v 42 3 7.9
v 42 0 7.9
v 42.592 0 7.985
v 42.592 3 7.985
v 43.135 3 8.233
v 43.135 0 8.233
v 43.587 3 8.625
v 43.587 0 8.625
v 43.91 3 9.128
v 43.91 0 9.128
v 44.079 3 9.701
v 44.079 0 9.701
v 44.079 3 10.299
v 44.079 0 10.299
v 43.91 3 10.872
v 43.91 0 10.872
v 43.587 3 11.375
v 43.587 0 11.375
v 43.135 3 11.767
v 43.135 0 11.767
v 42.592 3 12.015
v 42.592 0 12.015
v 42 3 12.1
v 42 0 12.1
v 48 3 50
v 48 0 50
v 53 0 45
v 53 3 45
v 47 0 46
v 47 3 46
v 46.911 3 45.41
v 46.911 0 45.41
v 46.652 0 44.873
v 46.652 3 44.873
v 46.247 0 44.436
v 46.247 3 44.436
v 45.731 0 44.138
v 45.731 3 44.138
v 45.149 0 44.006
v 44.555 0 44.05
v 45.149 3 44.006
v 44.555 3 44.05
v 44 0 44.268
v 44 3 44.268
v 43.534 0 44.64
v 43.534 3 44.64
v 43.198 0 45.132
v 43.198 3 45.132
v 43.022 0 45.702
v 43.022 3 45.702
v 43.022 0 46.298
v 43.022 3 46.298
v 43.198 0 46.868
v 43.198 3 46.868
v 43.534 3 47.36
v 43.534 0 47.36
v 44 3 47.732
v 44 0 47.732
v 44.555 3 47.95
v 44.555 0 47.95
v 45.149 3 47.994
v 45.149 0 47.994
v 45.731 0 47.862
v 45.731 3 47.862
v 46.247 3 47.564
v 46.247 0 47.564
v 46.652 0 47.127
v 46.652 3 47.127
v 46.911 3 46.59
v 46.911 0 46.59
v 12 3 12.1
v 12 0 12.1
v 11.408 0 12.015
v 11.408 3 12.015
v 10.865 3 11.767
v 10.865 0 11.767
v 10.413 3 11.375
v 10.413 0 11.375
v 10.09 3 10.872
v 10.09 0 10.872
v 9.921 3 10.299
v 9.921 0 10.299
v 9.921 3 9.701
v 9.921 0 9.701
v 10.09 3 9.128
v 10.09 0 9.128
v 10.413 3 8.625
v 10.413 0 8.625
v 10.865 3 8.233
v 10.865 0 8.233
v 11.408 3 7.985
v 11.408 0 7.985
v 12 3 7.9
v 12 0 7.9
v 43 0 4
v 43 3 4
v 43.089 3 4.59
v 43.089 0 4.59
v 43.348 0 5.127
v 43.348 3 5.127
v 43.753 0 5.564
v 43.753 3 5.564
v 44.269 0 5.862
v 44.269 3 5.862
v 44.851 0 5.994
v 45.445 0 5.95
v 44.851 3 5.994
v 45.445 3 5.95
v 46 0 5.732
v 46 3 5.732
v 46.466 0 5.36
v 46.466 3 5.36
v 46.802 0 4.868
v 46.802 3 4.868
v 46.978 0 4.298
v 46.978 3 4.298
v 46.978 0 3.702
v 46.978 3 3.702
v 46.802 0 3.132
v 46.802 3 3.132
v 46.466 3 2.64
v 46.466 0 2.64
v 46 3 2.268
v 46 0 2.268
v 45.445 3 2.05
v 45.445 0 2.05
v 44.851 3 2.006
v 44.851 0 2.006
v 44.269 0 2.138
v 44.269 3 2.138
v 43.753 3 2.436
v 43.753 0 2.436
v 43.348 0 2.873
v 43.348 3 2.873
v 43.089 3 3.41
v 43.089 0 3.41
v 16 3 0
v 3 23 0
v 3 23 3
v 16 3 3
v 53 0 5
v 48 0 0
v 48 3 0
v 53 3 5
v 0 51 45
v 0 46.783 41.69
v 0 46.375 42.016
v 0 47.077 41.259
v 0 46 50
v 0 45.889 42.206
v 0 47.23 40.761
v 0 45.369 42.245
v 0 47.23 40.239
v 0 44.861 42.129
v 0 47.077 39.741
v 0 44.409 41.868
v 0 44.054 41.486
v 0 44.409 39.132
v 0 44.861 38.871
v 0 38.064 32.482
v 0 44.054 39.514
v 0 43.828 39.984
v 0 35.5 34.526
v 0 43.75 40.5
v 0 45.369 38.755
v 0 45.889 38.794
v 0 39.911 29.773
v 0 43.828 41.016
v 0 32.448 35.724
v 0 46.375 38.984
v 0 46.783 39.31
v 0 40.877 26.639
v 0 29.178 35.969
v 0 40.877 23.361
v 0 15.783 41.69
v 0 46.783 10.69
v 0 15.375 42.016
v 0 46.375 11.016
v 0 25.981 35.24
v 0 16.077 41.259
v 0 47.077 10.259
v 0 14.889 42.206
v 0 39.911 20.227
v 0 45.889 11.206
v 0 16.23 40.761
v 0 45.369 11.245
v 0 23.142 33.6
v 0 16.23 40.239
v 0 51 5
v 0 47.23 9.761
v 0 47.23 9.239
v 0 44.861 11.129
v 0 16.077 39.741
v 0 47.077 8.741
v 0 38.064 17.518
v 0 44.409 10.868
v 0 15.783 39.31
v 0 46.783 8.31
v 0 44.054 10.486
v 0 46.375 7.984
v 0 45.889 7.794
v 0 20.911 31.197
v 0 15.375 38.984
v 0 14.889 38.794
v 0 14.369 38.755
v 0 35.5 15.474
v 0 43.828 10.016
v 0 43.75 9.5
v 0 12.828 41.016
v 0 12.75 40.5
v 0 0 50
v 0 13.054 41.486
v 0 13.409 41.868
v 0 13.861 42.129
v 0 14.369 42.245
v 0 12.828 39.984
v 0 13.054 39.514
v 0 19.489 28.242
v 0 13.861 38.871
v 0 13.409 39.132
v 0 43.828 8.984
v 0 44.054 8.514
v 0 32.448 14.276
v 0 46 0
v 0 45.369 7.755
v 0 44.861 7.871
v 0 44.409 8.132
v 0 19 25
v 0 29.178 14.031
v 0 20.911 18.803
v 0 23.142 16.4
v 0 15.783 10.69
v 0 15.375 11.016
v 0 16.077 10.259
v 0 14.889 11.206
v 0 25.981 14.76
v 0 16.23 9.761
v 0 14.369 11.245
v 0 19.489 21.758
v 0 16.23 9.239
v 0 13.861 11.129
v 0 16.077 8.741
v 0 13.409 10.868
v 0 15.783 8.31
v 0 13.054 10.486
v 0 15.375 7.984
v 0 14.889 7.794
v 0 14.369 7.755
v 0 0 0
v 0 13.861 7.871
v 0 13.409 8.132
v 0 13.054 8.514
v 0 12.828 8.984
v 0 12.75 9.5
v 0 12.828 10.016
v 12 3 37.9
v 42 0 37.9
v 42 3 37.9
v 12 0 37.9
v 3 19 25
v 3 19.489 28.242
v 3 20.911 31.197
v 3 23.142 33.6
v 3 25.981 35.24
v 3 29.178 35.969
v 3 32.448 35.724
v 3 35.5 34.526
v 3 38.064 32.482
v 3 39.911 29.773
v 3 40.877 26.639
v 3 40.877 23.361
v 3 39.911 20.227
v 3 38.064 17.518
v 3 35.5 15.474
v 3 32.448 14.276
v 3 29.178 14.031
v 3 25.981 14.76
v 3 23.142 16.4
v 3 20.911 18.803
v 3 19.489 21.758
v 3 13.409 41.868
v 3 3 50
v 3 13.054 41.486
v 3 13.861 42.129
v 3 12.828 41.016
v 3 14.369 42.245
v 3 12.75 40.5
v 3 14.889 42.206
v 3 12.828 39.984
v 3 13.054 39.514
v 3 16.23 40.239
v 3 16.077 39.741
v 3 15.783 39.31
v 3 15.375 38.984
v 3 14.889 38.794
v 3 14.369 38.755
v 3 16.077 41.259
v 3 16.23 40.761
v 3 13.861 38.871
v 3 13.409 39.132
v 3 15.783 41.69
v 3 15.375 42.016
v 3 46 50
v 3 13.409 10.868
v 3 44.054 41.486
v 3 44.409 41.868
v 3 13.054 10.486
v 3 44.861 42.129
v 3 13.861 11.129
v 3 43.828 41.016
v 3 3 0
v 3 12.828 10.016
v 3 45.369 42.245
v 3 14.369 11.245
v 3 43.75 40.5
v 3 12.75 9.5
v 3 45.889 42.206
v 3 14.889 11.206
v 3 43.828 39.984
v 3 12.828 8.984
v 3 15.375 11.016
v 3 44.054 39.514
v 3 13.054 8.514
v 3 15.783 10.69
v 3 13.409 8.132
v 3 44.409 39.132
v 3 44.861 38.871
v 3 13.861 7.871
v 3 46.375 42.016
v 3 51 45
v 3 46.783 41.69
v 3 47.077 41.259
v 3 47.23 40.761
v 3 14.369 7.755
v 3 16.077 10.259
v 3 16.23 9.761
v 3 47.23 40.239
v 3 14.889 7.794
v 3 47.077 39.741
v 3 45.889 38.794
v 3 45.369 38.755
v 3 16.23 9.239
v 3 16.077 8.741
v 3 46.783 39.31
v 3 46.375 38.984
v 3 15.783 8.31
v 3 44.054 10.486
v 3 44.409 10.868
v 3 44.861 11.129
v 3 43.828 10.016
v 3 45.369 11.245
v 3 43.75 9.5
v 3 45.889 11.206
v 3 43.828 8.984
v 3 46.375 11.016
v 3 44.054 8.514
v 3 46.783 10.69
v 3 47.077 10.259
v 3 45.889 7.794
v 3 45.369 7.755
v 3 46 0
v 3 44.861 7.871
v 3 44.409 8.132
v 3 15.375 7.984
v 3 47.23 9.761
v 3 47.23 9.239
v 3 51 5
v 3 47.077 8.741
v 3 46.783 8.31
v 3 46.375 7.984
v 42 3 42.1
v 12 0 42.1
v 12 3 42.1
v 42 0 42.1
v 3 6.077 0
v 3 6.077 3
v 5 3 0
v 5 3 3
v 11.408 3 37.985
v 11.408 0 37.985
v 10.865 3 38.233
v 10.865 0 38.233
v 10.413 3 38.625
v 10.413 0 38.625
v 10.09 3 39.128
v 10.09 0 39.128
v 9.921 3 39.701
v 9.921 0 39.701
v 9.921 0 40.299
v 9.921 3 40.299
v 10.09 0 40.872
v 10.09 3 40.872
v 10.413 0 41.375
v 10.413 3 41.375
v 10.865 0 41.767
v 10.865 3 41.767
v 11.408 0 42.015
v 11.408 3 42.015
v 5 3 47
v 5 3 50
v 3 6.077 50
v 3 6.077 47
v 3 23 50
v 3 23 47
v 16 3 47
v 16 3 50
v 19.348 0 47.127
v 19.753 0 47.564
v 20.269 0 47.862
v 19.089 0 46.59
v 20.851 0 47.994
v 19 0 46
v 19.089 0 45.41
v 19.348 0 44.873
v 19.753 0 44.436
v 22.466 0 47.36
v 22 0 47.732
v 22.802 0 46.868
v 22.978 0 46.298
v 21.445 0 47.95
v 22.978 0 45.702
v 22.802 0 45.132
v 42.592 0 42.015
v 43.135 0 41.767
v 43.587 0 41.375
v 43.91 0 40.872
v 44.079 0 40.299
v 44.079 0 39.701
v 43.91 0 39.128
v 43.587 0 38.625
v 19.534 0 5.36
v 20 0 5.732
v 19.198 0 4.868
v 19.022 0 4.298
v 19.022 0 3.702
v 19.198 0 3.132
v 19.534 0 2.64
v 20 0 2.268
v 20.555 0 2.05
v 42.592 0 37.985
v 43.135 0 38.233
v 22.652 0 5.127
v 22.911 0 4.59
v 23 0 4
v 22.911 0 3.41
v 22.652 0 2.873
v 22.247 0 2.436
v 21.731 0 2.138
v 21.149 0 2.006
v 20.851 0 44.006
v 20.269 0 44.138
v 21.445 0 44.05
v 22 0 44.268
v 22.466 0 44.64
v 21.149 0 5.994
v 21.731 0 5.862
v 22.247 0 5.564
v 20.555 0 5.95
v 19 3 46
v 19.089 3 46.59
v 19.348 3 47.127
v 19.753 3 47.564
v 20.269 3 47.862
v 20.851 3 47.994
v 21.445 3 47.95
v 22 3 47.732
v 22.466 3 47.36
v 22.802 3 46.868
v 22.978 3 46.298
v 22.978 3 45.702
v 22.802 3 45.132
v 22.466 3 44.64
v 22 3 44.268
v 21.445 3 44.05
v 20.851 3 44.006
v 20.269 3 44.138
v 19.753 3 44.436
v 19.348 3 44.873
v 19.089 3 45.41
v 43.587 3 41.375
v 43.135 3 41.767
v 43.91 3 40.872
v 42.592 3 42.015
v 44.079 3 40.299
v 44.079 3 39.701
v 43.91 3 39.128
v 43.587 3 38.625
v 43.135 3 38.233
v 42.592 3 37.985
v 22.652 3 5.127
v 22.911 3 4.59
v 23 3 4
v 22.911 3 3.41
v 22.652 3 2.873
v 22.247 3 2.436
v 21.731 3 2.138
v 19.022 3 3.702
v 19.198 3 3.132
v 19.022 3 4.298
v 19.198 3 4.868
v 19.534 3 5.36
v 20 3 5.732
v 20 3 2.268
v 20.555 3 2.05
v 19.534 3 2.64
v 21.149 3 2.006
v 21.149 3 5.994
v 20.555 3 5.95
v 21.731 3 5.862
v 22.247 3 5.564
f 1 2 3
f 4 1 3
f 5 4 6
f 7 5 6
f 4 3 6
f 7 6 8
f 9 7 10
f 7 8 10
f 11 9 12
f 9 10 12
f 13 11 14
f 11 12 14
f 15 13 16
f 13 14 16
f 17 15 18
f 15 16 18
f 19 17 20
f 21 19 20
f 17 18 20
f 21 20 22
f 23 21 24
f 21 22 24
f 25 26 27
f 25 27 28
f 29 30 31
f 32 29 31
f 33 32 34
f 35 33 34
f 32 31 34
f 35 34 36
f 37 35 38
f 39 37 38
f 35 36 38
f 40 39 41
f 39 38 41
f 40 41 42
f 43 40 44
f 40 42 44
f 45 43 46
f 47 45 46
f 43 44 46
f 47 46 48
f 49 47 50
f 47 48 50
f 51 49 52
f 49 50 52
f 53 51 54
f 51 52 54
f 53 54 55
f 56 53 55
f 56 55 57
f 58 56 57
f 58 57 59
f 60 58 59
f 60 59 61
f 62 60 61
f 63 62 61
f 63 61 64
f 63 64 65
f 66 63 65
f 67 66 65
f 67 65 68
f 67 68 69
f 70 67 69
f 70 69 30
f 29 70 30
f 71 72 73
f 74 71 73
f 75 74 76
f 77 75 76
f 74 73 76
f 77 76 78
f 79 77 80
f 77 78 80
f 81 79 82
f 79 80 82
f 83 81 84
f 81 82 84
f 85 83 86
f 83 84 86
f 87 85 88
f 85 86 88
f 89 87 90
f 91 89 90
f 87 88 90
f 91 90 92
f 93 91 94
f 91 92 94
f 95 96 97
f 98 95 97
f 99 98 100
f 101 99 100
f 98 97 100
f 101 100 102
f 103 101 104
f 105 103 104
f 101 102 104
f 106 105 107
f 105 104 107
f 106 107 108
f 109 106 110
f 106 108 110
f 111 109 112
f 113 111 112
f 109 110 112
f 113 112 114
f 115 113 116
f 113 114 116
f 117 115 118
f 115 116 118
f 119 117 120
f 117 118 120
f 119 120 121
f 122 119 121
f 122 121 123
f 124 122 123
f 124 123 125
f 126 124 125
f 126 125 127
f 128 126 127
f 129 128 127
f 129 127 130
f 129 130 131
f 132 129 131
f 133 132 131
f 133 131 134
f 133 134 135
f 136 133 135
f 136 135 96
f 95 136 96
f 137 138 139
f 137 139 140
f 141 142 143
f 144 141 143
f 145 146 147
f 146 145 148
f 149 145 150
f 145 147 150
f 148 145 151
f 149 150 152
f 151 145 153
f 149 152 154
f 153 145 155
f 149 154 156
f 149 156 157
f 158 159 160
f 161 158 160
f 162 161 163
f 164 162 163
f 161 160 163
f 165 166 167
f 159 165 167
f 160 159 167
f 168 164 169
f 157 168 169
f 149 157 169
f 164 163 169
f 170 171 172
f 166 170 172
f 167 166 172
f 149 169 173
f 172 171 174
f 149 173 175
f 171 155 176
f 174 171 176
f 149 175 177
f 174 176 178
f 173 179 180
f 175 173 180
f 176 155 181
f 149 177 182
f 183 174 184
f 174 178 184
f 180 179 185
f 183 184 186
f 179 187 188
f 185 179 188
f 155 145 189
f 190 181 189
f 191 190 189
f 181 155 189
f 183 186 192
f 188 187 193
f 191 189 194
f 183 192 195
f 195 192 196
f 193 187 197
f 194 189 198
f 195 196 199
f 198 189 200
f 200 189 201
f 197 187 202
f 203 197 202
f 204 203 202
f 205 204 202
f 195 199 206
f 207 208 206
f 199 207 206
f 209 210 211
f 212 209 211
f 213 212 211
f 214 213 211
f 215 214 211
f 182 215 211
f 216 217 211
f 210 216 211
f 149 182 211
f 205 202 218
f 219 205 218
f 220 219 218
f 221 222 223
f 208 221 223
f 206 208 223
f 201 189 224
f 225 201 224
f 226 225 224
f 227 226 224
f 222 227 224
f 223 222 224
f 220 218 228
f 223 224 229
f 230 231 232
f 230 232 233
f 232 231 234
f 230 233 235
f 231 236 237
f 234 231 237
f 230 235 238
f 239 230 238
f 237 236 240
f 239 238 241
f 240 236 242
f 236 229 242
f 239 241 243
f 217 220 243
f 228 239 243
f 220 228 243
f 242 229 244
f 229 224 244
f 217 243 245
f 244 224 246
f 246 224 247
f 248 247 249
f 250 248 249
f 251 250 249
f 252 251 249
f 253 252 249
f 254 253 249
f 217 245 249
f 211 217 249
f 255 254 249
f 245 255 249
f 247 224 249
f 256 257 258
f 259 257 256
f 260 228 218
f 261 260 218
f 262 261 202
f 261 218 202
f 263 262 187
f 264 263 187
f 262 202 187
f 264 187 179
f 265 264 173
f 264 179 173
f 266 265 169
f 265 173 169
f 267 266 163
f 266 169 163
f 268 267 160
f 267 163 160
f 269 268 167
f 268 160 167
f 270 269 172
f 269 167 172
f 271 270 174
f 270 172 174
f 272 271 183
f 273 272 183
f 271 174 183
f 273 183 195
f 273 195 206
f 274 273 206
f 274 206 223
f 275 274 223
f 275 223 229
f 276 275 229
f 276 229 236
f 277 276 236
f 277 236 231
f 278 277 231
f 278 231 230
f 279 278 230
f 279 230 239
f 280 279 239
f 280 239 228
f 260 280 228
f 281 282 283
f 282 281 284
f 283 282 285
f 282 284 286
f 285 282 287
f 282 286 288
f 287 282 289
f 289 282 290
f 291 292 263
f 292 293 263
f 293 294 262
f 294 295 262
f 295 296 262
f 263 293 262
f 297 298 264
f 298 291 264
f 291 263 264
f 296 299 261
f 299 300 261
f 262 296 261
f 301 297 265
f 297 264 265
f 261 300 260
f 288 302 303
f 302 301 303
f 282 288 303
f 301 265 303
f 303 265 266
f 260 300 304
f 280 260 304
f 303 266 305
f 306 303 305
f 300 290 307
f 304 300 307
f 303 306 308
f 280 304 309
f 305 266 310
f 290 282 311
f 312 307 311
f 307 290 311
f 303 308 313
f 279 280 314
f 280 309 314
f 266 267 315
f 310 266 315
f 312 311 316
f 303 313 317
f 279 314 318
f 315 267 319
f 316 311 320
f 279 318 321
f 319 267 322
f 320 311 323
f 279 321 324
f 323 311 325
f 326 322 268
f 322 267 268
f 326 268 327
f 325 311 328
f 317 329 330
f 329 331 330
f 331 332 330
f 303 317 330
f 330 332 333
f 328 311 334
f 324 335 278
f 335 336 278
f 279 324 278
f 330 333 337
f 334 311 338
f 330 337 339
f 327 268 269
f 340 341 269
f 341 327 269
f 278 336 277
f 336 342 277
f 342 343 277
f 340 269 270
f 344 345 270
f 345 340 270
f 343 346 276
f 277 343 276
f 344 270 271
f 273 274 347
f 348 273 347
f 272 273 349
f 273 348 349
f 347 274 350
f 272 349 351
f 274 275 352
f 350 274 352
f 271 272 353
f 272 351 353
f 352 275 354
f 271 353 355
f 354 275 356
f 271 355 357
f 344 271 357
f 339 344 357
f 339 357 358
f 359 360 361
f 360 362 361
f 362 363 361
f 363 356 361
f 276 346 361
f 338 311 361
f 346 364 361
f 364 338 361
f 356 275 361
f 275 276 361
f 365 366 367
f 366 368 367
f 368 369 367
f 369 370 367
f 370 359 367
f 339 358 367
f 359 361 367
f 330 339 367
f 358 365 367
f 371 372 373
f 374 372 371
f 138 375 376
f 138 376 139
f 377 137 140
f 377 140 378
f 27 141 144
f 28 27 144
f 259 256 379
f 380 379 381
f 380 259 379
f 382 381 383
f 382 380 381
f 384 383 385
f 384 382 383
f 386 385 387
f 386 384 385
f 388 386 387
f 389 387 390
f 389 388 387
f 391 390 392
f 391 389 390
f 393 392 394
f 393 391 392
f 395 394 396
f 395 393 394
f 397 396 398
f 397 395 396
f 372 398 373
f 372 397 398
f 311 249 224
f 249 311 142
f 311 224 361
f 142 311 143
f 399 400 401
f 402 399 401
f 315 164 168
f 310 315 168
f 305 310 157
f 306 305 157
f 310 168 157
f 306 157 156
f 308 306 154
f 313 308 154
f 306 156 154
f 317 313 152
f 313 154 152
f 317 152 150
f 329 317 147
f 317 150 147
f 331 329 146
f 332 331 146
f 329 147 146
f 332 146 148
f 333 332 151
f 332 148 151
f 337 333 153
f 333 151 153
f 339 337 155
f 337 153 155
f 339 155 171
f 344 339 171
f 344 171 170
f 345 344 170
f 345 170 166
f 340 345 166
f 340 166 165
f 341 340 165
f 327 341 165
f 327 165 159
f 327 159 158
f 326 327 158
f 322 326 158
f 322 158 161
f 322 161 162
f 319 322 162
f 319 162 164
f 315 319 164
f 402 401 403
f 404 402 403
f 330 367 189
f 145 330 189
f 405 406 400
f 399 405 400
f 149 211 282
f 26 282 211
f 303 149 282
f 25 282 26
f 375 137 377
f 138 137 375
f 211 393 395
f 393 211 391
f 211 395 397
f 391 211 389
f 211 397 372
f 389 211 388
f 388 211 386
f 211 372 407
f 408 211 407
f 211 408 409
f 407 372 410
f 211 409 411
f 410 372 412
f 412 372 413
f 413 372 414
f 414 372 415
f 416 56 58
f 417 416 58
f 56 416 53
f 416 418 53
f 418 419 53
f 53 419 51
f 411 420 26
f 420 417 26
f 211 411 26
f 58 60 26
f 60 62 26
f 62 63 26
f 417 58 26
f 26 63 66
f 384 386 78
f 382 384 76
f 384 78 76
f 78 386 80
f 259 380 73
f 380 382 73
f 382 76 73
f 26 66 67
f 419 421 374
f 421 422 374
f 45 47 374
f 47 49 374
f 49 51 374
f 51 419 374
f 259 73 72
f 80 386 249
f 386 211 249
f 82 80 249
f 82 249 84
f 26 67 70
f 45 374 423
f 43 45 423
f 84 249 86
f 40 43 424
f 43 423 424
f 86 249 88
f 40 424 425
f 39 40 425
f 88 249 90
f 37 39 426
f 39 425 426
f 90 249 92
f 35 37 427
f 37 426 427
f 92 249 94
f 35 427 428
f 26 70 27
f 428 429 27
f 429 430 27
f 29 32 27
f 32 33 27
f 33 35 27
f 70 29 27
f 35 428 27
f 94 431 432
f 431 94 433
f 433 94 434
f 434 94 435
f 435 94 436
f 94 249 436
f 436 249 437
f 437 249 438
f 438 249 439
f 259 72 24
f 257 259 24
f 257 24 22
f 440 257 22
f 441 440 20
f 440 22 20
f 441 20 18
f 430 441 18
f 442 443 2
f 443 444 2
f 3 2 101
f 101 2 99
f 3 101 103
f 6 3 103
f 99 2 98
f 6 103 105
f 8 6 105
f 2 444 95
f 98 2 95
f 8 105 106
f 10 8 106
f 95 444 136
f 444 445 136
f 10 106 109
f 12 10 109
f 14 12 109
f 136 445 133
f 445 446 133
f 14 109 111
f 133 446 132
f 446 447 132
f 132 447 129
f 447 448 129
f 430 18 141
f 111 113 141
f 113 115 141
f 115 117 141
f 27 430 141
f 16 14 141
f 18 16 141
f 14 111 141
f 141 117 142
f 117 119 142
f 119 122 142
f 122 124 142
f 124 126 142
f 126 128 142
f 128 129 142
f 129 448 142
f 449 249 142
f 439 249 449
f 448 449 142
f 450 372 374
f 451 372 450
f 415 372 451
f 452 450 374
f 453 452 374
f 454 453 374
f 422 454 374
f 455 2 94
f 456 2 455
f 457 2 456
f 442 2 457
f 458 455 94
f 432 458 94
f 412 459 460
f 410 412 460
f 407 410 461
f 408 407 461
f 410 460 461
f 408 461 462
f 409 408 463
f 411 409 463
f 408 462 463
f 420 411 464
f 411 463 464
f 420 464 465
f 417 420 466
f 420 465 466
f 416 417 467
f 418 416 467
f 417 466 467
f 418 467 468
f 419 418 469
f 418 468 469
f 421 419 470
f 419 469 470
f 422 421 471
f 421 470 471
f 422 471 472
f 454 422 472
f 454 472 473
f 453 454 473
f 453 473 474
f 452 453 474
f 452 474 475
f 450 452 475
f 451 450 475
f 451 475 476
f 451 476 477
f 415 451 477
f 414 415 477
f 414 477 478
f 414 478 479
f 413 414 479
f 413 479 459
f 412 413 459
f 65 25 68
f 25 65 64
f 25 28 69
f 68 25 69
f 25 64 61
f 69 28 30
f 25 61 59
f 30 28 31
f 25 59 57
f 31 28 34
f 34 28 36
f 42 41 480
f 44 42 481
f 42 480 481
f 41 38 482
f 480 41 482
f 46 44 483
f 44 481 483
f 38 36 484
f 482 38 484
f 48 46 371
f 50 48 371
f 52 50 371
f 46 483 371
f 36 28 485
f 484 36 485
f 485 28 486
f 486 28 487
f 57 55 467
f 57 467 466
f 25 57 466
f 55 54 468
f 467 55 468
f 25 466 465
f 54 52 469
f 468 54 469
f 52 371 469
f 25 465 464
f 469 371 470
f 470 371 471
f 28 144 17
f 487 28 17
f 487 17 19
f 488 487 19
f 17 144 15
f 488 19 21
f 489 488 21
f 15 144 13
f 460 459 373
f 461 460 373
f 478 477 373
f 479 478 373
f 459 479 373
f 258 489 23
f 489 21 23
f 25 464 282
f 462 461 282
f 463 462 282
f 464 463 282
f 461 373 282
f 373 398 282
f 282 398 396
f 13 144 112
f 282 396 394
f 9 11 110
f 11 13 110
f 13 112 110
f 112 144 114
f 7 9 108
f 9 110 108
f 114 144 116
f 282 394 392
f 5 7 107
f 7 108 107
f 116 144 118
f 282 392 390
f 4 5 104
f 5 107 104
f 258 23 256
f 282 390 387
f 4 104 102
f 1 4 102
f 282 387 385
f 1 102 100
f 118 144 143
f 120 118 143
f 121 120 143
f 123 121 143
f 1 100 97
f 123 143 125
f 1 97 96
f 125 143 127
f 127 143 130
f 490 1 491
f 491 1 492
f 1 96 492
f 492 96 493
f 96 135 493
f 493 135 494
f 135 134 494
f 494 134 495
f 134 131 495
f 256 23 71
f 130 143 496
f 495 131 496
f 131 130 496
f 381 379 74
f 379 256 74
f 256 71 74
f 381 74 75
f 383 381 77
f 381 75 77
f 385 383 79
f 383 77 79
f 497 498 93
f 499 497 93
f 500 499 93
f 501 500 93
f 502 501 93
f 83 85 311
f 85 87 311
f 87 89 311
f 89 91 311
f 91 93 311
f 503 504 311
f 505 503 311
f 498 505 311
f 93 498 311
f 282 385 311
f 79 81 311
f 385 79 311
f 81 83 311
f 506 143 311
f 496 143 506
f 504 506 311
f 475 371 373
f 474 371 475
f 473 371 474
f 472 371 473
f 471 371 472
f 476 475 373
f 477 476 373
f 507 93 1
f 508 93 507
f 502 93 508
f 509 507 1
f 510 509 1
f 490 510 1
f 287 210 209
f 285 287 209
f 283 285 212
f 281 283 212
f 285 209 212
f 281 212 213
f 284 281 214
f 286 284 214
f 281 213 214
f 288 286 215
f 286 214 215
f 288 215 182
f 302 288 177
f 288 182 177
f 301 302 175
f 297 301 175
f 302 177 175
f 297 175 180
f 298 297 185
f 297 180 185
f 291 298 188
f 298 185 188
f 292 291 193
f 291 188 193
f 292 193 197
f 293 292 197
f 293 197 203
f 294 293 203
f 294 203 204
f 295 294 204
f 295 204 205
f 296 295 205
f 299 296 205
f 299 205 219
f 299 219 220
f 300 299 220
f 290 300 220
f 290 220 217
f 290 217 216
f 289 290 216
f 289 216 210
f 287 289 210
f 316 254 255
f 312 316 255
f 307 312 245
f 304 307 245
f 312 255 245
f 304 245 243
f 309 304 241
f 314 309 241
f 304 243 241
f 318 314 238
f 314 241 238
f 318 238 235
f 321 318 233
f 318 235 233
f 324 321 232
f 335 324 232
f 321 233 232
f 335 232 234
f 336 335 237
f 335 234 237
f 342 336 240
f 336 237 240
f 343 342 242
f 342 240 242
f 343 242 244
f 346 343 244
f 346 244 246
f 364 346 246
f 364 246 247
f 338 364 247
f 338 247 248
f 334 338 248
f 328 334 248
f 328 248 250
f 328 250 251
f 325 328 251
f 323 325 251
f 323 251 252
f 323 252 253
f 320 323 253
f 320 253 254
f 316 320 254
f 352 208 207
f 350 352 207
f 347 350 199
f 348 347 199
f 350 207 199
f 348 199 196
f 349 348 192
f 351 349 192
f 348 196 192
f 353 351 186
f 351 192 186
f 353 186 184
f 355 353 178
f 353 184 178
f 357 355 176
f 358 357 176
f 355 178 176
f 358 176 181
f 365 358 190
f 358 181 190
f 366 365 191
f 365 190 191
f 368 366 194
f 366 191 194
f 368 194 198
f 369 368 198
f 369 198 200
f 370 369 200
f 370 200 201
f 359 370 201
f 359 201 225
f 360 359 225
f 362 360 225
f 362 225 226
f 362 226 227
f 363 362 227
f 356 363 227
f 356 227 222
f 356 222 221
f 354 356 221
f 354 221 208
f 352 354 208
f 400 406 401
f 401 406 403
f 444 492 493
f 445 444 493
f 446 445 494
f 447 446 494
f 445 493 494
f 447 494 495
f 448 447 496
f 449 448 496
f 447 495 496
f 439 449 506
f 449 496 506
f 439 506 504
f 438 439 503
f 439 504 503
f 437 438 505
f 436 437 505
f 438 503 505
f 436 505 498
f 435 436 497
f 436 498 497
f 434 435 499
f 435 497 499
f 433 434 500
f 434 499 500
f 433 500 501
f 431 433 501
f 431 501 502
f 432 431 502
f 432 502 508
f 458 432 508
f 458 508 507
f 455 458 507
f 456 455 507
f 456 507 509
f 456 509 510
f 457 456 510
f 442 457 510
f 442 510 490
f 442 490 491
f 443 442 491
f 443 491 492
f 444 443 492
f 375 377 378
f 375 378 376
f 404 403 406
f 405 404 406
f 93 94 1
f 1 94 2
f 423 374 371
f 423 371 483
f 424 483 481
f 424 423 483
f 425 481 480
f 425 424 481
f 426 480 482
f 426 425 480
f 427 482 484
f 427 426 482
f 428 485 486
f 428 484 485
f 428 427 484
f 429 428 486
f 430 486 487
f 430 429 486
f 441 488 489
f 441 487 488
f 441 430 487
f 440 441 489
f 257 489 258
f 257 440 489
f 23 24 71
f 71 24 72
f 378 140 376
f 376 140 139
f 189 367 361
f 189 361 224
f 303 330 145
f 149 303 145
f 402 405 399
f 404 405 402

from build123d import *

# Parameters (mm, degrees)
BOSS_EXTRU_1_DEPTH      = 50
ESQUISSE2_R             = 1.75
ESQUISSE2_R_2           = 11
ENL_V_MAT_EXTRU_1_DEPTH = 89.938180777
CHANFREIN1_SIZE         = 5
ENL_V_MAT_EXTRU_2_DEPTH = 89.938180777
BOSS_EXTRU_2_DEPTH      = 3
BOSS_EXTRU_3_START      = -50
BOSS_EXTRU_3_DEPTH      = 3
ESQUISSE5_R             = 2
ENL_V_MAT_EXTRU_3_DEPTH = 88.252507127


with BuildPart() as part:
    # Esquisse1 → Boss.-Extru.1 (new body)
    with BuildSketch(Plane.XY):
        Polygon((0, 0), (53, 0), (53, 3), (3, 3), (3, 51), (0, 51), align=None)
    extrude(amount=BOSS_EXTRU_1_DEPTH)

    # Esquisse2 → Enlèv. mat.-Extru.1 (cut, through all)
    with BuildSketch(Plane.ZY):
        with Locations(Location((9.5, 45.5, 0), (0, 0, 270))):
            Circle(ESQUISSE2_R)
        with Locations(Location((40.5, 45.5, 0), (0, 0, 270))):
            Circle(ESQUISSE2_R)
        with Locations(Location((40.5, 14.5, 0), (0, 0, 270))):
            Circle(ESQUISSE2_R)
        with Locations(Location((9.5, 14.5, 0), (0, 0, 270))):
            Circle(ESQUISSE2_R)
        with Locations(Location((25, 30, 0), (0, 0, 270))):
            Circle(ESQUISSE2_R_2)
    extrude(amount=-ENL_V_MAT_EXTRU_1_DEPTH, mode=Mode.SUBTRACT)

    # Chanfrein1
    chanfrein1_edges = [part.edges().sort_by_distance(p)[0] for p in [
        (53, 1.5, 50),
        (1.5, 51, 50),
        (1.5, 51, 0),
        (53, 1.5, 0),
    ]]
    chamfer(chanfrein1_edges, length=CHANFREIN1_SIZE)

    # Esquisse3 → Enlèv. mat.-Extru.2 (cut, through all)
    with BuildSketch(Plane.XZ):
        with BuildLine():
            Line((12, 42.1), (42, 42.1))
            ThreePointArc((42, 42.1), (44.1, 40), (42, 37.9))
            Line((42, 37.9), (12, 37.9))
            ThreePointArc((12, 37.9), (9.9, 40), (12, 42.1))
        make_face()
        with BuildLine():
            Line((12, 7.9), (42, 7.9))
            ThreePointArc((42, 7.9), (44.1, 10), (42, 12.1))
            Line((42, 12.1), (12, 12.1))
            ThreePointArc((12, 12.1), (9.9, 10), (12, 7.9))
        make_face()
    extrude(amount=-ENL_V_MAT_EXTRU_2_DEPTH, mode=Mode.SUBTRACT)

    # Esquisse5 → Enlèv. mat.-Extru.3 (cut, through all)
    with BuildSketch(Plane(origin=(0, 3, 0), x_dir=(1, 0, 0), z_dir=(0, 1, 0))):
        with Locations(Location((45, -4, 0), (0, 0, 180))):
            Circle(ESQUISSE5_R)
        with Locations((45, -46)):
            Circle(ESQUISSE5_R)
        with Locations(Location((21, -46, 0), (0, 0, 180))):
            Circle(ESQUISSE5_R)
        with Locations((21, -4)):
            Circle(ESQUISSE5_R)
    extrude(amount=-ENL_V_MAT_EXTRU_3_DEPTH, mode=Mode.SUBTRACT)


with BuildPart() as body_2:
    # Esquisse4 → Boss.-Extru.2 (new body)
    with BuildSketch(Plane.XY.offset(50)):
        Polygon((3, 23), (16, 3), (5, 3), (3, 6.076923077), align=None)
    extrude(amount=-BOSS_EXTRU_2_DEPTH)


with BuildPart() as body_3:
    # Esquisse4<2> → Boss.-Extru.3 (new body)
    with BuildSketch(Plane.XY.offset(50).offset(BOSS_EXTRU_3_START)):
        Polygon((3, 23), (16, 3), (5, 3), (3, 6.076923077), align=None)
    extrude(amount=BOSS_EXTRU_3_DEPTH)


solid = Compound([part.part, body_2.part, body_3.part])
